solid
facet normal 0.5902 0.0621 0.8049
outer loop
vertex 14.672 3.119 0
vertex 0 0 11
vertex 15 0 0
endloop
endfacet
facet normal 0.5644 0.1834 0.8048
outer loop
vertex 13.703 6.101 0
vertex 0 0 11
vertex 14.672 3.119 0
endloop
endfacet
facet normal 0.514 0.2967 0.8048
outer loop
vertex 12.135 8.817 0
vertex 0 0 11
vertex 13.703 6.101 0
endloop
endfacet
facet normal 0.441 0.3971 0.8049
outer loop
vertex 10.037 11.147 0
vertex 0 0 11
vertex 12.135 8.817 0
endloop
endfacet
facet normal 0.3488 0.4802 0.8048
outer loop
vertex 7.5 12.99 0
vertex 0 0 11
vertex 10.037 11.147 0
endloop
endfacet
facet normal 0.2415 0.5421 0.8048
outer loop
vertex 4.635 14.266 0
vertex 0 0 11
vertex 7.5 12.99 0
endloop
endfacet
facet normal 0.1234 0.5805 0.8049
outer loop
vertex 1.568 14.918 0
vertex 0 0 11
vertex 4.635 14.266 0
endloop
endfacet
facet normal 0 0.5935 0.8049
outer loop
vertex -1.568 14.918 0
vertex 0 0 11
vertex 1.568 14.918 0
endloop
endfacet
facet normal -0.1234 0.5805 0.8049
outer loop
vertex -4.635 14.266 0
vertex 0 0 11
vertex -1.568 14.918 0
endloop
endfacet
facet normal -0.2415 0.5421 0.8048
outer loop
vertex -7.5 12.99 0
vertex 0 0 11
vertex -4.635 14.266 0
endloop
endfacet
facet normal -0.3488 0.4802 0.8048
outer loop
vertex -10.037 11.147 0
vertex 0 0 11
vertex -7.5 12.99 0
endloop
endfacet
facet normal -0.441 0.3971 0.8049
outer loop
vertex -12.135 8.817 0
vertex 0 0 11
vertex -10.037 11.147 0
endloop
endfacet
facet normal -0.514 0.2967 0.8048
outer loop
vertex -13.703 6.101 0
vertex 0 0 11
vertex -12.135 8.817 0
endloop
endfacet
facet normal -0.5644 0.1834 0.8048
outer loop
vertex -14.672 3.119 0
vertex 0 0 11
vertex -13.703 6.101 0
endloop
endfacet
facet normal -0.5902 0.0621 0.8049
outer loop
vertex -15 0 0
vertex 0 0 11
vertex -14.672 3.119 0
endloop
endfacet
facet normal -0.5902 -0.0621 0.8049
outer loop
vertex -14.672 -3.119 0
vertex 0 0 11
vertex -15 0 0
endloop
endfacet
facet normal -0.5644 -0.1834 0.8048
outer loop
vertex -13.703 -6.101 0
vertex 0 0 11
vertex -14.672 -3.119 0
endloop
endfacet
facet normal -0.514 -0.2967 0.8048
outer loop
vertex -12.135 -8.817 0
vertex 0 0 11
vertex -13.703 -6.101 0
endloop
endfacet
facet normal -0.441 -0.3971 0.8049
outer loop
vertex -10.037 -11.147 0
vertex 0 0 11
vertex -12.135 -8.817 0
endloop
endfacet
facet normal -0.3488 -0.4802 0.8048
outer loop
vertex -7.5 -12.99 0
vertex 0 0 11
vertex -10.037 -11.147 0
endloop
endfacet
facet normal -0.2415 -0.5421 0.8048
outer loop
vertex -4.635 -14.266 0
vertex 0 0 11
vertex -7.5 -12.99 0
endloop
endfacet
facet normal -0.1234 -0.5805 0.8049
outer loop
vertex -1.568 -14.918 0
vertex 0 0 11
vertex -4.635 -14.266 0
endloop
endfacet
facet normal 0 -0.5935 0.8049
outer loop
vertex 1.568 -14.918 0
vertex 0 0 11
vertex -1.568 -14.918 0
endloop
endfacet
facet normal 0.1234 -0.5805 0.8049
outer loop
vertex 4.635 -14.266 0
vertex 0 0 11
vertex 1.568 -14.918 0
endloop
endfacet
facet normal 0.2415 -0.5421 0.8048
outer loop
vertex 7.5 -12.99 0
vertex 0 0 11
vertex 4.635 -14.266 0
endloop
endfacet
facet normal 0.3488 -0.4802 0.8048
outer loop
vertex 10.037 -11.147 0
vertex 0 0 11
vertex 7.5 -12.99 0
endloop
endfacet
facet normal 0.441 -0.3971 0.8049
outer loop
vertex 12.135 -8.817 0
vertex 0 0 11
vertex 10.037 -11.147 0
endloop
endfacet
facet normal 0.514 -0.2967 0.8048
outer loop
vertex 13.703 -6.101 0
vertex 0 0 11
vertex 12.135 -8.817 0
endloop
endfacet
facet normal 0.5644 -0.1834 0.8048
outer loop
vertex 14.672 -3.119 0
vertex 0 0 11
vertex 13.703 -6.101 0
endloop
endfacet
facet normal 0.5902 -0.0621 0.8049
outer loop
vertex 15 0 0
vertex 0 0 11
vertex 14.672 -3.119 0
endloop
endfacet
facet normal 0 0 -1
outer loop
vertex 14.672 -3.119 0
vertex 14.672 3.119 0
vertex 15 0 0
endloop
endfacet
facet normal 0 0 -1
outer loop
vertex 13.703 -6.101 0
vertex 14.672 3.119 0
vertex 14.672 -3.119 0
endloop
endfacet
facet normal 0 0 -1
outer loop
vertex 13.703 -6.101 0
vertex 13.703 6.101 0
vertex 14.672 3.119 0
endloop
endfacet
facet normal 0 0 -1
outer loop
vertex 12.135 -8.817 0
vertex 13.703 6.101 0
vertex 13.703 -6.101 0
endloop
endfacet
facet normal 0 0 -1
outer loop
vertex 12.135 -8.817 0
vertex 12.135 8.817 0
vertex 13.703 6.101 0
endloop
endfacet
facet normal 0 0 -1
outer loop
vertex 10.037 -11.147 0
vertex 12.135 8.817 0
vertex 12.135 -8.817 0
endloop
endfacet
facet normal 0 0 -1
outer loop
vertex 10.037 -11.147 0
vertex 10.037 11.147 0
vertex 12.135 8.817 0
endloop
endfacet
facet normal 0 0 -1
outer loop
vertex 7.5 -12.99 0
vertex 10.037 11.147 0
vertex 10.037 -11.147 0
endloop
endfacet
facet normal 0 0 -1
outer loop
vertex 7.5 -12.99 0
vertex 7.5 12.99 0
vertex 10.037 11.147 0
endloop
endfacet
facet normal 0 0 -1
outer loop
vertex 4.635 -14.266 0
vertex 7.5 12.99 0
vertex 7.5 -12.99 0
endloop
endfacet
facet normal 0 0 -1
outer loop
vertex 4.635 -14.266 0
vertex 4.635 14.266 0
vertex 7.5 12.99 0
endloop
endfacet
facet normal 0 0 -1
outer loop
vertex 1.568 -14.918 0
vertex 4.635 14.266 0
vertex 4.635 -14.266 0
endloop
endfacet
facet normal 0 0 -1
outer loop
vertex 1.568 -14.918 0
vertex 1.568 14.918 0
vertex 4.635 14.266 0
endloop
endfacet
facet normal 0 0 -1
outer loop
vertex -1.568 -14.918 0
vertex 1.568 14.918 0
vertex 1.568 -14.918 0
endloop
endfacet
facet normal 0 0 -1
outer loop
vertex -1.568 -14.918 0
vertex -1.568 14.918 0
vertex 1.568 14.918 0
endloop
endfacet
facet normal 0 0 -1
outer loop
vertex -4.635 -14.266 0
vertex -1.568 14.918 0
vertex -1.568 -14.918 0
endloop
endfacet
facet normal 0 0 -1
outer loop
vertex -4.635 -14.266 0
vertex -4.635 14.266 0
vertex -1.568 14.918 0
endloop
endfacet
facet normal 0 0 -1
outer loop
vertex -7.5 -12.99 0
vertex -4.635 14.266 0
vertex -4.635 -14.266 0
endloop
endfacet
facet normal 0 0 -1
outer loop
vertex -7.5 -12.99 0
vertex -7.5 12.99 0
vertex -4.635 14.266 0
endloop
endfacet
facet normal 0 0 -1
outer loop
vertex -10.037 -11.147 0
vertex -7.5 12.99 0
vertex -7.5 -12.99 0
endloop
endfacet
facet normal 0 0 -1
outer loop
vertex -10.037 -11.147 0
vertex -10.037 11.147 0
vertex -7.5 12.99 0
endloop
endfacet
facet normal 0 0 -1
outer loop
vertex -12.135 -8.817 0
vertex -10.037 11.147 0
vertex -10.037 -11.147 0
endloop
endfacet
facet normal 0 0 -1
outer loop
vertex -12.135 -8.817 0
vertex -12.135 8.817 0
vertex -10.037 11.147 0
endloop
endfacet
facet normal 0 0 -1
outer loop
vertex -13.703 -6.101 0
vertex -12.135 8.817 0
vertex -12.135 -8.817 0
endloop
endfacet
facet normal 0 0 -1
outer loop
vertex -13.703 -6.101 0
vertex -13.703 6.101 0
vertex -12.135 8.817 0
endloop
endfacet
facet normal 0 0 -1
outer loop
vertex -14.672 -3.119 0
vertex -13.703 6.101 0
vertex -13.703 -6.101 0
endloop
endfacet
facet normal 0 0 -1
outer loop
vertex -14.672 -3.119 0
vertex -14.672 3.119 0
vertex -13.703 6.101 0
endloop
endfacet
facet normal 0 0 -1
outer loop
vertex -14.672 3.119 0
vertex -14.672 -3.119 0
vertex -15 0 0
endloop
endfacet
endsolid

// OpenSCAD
// Generated by SolidPython 1.0.1 on 2020-07-29 00:39:25


cylinder(h = 11, r1 = 15, r2 = 0);
/***********************************************
*********      SolidPython code:      **********
************************************************
 
# import packages: SolidPython
from solid import *
from solid.utils import *
from itertools import chain, combinations


class Resize:

    def __init__(self, scad_file):
        self.scad_file = scad_file
        #self.scad_file = import_scad(scad_file)
        # cone/cylinder param:
        self.r1 = 0
        self.r2 = 0
        self.h = 0
        # rectangular prism param:
        self.w = 0
        self.l = 0
        # ellipse param:
        self.r = 0

    # import OpenScad code (file name corresponds to shape)


    # classify shape + parameters
    def assign(self, param1, param2, param3):
        if self.scad_file == 'cone.scad':
            self.r1 = param1
            self.r2 = param2
            self.h = param3
        elif self.scad_file == 'cylinder.scad':
            self.r1 = param1
            self.r2 = param2
            self.h = param3
        elif self.scad_file == 'rectangularPrism.scad':
            self.h = param1
            self.l = param2
            self.w = param3
        else:
            self.r = param1
            self.h = param2

    # resize parameters
    def iterate(self):
        x = range(3, 20, 2)
        i = 1
        if self.scad_file == 'cone.scad':
            tempList = list(combinations(x, 2))
            for temp in tempList:
                param1 = temp[0]
                param2 = temp[1]
                filepath = 'produced_scad_files/' + 'cone' + str(param1) + '_' + str(param2) + '_' + '.scad'
                scad_render_to_file(cylinder(h=param1, r1=param2, r2=0), filepath)

        elif self.scad_file == 'cylinder.scad':
            tempList = list(combinations(x, 3))
            for temp in tempList:
                param1 = temp[0]
                param2 = temp[1]
                filepath = 'produced_scad_files/' + 'cylinder' + str(param1) + '_' + str(param2) + '_' + '.scad'
                scad_render_to_file(cylinder(h=param1, r1=param2, r2=param2), filepath)

        elif self.scad_file == 'rectangularPrism.scad':
            tempList = list(combinations(x, 3))
            for temp in tempList:
                param1 = temp[0]
                param2 = temp[1]
                param3 = temp[2]
                filepath = 'produced_scad_files/' + 'rectangularPrism' + str(param1) + '_' + str(param2) + '_' + str(
                    param3) + '.scad'
                scad_render_to_file(cube(size=(param1, param2, param3)), filepath)

        elif self.scad_file == 'ellipse.scad':
            tempList = list(combinations(x, 4))
            for temp in tempList:
                param1 = temp[0]
                param2 = temp[1]
                param3 = temp[2]
                param4 = temp[3]
                filepath = 'produced_scad_files/' + 'ellipse' + str(param1) + '_' + str(param2) + '_' + str(param3) + '_' + str(param4) + '.scad'
                scad_render_to_file(scale([param1, param2, param3])(sphere(r=param4)), filepath)

    def render_to_scadfile(self):
        scad_render_to_file(scad, 'example.scad') 
 
************************************************/
